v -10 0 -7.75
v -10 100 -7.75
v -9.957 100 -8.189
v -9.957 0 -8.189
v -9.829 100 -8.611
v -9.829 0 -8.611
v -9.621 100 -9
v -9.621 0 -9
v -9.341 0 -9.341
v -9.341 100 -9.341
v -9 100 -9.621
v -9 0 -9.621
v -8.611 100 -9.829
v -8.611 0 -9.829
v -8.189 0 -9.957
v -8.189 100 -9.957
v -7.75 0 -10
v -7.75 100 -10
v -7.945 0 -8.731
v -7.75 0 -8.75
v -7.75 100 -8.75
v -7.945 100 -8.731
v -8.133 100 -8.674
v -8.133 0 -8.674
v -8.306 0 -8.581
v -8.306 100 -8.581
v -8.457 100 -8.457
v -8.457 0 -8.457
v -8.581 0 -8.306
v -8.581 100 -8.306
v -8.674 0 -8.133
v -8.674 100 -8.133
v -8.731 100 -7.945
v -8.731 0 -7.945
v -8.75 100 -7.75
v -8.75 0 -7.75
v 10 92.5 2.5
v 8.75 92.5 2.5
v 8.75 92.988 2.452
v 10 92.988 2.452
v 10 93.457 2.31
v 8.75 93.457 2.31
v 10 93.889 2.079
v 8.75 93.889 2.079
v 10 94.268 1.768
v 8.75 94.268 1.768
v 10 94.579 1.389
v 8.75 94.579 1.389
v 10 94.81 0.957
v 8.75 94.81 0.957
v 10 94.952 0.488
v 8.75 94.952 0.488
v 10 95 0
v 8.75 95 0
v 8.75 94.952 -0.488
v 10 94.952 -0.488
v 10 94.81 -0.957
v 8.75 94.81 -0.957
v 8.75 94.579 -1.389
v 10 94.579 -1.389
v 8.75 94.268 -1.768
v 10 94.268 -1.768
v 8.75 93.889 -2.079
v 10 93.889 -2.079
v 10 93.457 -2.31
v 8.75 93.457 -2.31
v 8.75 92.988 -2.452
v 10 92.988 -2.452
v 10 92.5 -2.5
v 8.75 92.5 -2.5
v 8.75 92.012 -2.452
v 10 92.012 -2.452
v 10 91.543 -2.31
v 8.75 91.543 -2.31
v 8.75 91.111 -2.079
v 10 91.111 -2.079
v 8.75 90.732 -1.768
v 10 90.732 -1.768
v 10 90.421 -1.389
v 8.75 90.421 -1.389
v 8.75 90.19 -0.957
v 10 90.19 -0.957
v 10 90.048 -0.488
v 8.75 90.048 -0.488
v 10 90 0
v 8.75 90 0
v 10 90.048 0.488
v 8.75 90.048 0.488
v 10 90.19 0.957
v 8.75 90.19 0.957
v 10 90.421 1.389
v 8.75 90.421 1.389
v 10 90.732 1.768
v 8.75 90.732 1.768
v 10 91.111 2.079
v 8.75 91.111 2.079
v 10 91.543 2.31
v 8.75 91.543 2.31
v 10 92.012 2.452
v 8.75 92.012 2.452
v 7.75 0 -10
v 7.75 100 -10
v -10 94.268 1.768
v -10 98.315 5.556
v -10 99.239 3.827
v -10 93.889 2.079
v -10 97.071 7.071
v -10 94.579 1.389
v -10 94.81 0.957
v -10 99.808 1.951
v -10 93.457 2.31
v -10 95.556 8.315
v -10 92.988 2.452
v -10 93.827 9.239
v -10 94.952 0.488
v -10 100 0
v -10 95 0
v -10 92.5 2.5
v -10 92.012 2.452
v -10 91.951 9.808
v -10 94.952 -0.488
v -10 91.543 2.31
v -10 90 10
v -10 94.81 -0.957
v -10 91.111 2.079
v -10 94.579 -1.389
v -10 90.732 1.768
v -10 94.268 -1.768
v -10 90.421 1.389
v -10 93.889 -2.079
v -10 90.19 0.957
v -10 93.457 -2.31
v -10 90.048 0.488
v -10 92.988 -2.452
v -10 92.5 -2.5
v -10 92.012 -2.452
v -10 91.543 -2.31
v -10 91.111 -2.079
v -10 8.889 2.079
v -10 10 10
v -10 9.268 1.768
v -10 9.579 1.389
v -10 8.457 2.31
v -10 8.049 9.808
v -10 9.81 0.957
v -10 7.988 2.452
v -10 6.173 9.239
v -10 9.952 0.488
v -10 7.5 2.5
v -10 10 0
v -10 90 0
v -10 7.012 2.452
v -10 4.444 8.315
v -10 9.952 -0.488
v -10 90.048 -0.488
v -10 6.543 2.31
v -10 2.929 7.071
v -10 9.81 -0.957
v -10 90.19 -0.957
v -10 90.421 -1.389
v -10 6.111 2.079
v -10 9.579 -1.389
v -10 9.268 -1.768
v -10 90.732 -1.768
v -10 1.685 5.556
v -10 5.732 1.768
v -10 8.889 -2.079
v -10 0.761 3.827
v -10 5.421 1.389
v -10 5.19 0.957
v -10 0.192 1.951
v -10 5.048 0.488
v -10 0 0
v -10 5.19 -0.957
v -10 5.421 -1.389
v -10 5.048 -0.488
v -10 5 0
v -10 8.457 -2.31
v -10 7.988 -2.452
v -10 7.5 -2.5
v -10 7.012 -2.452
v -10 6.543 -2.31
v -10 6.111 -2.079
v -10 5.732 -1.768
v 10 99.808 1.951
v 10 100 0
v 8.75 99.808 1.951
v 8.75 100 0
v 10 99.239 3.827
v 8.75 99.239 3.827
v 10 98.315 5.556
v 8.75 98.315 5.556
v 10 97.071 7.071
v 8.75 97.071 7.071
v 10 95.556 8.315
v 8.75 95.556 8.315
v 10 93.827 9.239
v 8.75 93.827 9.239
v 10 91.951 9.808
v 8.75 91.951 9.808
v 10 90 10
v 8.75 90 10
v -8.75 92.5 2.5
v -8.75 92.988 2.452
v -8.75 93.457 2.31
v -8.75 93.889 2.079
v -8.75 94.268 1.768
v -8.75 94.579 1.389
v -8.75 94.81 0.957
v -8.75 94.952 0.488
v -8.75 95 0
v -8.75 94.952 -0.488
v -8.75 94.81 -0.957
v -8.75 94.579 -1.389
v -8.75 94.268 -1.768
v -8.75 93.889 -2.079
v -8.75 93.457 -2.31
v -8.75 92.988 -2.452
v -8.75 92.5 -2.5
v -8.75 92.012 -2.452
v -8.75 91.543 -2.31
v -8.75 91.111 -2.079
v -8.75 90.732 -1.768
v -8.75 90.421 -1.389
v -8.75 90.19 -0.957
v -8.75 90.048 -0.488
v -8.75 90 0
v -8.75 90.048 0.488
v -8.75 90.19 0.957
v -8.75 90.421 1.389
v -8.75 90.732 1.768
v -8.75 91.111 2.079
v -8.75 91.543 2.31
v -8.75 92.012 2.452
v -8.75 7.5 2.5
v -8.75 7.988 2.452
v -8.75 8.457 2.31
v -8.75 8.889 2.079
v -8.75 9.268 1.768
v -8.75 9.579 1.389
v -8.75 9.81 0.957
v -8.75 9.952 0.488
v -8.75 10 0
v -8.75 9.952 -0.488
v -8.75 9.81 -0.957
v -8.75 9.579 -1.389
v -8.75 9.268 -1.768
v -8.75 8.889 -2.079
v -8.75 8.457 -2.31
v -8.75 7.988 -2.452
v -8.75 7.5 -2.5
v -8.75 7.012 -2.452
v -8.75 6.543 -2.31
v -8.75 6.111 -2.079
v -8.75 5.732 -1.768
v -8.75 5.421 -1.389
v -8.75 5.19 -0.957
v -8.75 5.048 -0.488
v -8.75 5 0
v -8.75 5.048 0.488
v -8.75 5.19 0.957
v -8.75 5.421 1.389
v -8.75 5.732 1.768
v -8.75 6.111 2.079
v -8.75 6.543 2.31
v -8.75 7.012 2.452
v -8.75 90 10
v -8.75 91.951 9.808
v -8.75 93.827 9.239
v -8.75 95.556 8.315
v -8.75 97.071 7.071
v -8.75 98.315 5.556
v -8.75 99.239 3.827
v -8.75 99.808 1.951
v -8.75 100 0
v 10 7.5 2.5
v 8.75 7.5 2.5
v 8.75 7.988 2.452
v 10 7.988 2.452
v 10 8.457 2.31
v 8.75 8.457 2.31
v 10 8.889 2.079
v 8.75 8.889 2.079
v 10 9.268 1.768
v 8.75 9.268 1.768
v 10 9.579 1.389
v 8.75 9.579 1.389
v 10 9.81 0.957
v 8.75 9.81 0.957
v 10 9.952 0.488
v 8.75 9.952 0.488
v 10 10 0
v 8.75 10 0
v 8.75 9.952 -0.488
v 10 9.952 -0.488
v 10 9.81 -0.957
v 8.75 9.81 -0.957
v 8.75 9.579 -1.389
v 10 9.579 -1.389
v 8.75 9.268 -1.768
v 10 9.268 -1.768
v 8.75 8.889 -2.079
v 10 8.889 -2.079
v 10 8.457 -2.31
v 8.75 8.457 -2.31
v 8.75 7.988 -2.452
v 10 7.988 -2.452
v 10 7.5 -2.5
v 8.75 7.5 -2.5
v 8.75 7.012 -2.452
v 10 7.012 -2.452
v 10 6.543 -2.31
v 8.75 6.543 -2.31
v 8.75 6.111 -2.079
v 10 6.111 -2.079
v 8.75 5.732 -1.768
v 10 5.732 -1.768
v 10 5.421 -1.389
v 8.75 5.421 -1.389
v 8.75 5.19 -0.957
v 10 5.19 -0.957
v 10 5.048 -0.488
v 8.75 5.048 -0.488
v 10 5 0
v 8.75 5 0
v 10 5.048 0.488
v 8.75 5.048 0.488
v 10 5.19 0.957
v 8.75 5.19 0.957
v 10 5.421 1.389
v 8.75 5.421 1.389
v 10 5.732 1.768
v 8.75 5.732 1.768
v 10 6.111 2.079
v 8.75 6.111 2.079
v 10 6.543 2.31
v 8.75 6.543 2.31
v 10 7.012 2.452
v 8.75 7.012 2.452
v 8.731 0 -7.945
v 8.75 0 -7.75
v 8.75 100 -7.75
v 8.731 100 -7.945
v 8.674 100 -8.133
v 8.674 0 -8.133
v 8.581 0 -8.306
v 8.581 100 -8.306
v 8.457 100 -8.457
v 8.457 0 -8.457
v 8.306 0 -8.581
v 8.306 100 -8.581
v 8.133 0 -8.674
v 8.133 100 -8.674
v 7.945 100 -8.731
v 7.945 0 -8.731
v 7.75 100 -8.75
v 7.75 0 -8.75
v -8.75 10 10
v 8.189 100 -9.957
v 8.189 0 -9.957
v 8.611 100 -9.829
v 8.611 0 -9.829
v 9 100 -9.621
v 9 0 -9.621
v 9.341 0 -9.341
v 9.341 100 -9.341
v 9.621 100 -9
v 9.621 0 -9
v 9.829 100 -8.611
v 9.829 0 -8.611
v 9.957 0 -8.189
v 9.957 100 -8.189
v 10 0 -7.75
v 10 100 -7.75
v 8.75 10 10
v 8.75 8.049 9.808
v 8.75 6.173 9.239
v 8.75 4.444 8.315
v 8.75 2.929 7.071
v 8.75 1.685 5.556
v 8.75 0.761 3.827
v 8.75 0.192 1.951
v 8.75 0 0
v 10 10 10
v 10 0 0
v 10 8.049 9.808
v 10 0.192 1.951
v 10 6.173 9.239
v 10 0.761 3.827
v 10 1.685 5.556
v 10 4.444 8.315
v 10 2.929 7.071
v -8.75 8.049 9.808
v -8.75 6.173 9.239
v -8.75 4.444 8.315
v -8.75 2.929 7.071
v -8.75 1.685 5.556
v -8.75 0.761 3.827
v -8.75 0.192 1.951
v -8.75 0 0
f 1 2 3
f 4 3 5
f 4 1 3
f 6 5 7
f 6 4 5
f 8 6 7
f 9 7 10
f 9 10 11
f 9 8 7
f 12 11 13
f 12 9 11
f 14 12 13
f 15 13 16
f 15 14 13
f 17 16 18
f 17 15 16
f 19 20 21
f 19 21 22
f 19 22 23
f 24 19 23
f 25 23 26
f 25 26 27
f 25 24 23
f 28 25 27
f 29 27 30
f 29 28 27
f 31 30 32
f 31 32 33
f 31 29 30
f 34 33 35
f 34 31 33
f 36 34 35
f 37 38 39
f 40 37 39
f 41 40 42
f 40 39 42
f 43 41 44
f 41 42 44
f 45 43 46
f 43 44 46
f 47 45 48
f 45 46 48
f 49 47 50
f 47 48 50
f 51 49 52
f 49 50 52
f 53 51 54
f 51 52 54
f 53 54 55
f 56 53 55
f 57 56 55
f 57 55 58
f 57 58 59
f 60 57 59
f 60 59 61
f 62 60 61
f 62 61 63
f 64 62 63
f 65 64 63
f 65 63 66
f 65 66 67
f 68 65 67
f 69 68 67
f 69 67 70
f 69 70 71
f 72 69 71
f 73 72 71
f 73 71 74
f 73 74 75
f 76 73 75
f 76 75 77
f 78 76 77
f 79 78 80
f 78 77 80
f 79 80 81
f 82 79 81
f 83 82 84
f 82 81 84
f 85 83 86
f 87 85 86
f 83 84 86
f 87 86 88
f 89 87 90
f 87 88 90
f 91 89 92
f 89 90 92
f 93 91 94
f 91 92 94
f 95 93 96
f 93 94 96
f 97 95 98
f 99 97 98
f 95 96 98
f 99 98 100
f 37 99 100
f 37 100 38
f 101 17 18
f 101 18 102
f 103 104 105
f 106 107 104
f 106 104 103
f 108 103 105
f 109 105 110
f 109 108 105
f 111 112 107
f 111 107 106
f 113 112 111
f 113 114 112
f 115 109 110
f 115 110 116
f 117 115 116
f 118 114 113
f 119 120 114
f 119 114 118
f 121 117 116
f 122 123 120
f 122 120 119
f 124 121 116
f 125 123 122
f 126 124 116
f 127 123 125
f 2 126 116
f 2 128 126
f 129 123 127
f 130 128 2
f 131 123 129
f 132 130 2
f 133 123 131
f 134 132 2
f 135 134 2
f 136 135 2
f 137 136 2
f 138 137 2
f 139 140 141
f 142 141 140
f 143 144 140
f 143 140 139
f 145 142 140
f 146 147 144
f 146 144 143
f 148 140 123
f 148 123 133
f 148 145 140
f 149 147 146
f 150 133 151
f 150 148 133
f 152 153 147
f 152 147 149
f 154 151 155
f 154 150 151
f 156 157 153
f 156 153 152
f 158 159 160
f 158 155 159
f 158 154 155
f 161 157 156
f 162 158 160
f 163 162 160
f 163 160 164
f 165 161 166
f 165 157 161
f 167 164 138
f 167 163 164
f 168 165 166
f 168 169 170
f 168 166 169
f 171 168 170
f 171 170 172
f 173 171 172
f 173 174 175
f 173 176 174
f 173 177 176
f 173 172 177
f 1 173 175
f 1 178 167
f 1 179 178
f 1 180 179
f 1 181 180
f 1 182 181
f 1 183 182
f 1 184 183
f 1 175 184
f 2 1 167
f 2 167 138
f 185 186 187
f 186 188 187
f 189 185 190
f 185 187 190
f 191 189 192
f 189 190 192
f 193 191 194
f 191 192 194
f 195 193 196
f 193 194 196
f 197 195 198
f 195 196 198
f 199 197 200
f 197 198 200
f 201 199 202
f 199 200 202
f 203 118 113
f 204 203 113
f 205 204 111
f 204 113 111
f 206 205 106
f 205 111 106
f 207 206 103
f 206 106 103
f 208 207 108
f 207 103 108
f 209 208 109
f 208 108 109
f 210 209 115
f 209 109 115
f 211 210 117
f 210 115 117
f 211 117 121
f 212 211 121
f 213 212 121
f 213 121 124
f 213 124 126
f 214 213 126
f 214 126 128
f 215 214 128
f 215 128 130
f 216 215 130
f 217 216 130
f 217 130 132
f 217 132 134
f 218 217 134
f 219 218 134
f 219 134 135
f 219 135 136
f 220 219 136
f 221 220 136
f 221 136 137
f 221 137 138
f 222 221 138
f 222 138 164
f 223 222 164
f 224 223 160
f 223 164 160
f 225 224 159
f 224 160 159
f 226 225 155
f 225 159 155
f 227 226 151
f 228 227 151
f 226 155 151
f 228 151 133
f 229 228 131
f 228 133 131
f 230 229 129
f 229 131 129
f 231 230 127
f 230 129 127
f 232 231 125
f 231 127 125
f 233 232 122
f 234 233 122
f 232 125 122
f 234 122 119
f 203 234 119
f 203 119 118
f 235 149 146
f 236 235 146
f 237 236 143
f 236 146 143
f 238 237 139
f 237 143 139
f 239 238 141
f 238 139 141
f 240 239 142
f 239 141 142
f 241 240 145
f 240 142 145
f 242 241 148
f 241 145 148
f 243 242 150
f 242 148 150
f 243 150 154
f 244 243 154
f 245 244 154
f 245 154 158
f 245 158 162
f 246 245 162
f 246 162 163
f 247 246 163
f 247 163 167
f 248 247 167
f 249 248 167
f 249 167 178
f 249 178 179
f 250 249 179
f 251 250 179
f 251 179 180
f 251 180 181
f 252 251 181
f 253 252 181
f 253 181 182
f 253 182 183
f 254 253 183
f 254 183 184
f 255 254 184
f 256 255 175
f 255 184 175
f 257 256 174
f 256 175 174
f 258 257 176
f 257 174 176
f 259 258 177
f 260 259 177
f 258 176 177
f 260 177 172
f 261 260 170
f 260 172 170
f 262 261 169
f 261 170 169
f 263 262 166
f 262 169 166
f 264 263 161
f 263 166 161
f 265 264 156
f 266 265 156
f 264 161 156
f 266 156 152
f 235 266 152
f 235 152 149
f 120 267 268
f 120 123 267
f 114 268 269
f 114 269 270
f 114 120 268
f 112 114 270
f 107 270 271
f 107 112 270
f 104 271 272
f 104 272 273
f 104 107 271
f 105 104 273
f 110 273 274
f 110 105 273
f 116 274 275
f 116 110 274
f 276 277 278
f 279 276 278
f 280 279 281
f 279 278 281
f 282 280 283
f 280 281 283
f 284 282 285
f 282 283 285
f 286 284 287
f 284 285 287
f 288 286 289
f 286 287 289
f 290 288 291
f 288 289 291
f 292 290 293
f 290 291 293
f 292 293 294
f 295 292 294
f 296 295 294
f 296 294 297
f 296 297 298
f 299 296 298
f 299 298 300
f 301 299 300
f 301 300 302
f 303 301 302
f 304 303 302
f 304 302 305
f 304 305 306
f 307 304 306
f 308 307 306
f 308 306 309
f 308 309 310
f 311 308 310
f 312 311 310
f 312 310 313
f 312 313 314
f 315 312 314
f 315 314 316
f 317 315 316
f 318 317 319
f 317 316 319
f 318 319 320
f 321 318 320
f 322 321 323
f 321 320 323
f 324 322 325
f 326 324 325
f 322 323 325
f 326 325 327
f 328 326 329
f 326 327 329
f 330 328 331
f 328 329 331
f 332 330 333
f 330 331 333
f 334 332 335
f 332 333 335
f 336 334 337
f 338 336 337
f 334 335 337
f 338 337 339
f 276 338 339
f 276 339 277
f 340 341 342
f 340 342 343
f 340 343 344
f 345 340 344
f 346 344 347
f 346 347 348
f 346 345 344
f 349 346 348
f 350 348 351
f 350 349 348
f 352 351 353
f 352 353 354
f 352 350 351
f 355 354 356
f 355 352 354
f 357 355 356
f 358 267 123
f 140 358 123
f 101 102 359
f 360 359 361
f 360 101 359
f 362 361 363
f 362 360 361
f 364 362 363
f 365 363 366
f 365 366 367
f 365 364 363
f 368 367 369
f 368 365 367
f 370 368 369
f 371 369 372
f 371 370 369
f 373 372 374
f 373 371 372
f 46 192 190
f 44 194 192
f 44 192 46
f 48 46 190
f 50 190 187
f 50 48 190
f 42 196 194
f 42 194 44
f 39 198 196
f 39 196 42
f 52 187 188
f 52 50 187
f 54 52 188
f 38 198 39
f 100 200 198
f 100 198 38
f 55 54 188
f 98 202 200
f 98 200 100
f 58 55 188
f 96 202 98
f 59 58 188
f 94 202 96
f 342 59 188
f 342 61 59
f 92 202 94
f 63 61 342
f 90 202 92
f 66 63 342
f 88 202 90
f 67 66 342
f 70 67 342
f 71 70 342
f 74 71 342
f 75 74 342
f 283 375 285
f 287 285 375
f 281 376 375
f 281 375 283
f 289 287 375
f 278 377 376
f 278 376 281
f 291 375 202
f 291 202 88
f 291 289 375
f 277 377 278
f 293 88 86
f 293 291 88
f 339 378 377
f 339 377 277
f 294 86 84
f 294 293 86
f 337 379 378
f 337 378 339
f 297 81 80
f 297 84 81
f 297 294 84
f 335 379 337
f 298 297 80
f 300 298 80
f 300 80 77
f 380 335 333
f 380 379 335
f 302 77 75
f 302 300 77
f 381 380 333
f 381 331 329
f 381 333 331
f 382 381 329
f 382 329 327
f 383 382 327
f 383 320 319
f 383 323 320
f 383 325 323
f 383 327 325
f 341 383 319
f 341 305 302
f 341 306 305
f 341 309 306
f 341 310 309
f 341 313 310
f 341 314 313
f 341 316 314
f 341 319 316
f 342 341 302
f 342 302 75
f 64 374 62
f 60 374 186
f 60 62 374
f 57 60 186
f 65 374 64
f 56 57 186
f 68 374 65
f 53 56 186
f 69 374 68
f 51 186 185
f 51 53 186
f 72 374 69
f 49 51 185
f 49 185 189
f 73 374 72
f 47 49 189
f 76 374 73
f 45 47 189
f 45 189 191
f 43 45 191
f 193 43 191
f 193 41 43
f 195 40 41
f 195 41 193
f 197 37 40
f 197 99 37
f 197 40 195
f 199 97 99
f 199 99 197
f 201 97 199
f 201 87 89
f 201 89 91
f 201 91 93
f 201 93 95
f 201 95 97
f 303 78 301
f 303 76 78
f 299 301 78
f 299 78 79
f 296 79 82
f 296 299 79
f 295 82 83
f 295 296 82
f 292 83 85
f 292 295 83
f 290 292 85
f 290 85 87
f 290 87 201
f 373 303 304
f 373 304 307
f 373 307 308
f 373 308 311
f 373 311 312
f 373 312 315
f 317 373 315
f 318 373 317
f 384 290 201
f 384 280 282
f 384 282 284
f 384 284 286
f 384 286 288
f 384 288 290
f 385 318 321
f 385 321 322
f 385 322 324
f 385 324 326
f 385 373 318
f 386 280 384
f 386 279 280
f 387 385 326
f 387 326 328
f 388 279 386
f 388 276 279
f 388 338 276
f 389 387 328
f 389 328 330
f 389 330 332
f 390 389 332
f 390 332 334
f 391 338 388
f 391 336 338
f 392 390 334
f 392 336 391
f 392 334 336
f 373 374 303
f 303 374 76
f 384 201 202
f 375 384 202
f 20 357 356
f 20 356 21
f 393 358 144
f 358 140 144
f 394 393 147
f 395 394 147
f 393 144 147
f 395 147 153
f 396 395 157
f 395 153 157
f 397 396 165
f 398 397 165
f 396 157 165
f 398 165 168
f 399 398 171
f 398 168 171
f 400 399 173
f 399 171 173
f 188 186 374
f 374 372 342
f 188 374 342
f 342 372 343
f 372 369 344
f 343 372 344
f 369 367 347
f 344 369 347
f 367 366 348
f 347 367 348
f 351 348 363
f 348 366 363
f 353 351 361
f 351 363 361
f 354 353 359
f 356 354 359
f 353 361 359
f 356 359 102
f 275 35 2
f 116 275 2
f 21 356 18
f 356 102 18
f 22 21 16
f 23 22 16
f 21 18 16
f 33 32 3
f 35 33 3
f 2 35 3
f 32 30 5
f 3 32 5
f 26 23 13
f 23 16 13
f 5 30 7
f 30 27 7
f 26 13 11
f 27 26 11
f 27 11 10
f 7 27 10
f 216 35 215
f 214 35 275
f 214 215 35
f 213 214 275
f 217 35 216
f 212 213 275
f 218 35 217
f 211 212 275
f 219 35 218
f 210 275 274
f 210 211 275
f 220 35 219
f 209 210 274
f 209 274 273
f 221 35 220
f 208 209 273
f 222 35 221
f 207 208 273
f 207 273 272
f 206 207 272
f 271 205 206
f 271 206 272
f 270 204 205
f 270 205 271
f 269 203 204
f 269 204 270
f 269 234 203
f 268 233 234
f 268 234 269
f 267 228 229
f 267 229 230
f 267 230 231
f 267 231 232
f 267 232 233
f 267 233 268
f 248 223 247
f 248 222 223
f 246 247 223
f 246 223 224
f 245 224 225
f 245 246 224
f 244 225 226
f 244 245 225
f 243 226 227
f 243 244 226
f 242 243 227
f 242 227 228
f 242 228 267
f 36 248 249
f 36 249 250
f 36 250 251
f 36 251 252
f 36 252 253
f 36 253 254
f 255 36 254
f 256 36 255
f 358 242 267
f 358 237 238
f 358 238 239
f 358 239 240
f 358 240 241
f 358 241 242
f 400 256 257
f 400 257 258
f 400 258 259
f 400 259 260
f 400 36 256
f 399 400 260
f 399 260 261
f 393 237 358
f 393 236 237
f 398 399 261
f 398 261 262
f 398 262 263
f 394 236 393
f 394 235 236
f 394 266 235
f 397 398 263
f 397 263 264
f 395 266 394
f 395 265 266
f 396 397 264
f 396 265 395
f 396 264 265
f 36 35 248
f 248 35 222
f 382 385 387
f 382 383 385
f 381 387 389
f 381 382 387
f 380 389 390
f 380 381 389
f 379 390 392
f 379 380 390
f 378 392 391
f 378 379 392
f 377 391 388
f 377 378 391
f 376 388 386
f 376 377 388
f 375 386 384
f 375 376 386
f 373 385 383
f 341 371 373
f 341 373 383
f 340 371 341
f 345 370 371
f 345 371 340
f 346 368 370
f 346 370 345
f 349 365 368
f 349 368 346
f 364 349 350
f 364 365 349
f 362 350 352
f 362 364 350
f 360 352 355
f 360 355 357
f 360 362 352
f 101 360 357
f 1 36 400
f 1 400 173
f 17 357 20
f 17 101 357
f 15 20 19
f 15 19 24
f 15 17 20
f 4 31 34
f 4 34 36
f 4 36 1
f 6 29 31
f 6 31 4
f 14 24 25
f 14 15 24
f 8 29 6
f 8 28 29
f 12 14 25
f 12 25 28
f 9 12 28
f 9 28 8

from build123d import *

# Parameters (mm, degrees)
BASE_FLANGE1_DEPTH = 100
CUT_EXTRUDE1_REACH = 104.47
SKETCH3_R          = 2.5
FILLET1_R          = 10


# Sheet-metal steps are written as plain solids
with BuildPart() as part:
    # Sketch2 → Base-Flange1 (new body)
    with BuildSketch(Plane(origin=(0, 0, 0), x_dir=(1, 0, 0), z_dir=(0, 1, 0))):
        with BuildLine():
            Line((-10, -10), (-10, 7.75))
            ThreePointArc((-10, 7.75), (-9.340990258, 9.340990258), (-7.75, 10))
            Line((-7.75, 10), (7.75, 10))
            ThreePointArc((7.75, 10), (9.340990258, 9.340990258), (10, 7.75))
            Line((10, 7.75), (10, -10))
            Line((10, -10), (8.75, -10))
            Line((8.75, -10), (8.75, 7.75))
            ThreePointArc((8.75, 7.75), (8.457106781, 8.457106781), (7.75, 8.75))
            Line((7.75, 8.75), (-7.75, 8.75))
            ThreePointArc((-7.75, 8.75), (-8.457106781, 8.457106781), (-8.75, 7.75))
            Line((-8.75, 7.75), (-8.75, -10))
            Line((-8.75, -10), (-10, -10))
        make_face()
    extrude(amount=BASE_FLANGE1_DEPTH)

    # Cut-Extrude1: up to this face of the body (flat: up to its plane)
    cut_extrude1_end = Plane(part.part.faces().sort_by_distance((10, 50, 1.125))[0])
    # Sketch3 → Cut-Extrude1 (cut, up to the picked face)
    with BuildSketch(Plane.ZY.offset(10), mode=Mode.PRIVATE) as cut_extrude1_sk1:
        with Locations((0, 7.5)):
            Circle(SKETCH3_R)
    cut_extrude1_tool1 = split(extrude(cut_extrude1_sk1.sketch, amount=-CUT_EXTRUDE1_REACH, mode=Mode.PRIVATE), bisect_by=cut_extrude1_end, keep=Keep.BOTH, mode=Mode.PRIVATE)
    # Sketch3 → Cut-Extrude1 (cut, up to the picked face)
    with BuildSketch(Plane.ZY.offset(10), mode=Mode.PRIVATE) as cut_extrude1_sk2:
        with Locations((0, 92.5)):
            Circle(SKETCH3_R)
    cut_extrude1_tool2 = split(extrude(cut_extrude1_sk2.sketch, amount=-CUT_EXTRUDE1_REACH, mode=Mode.PRIVATE), bisect_by=cut_extrude1_end, keep=Keep.BOTH, mode=Mode.PRIVATE)
    add(cut_extrude1_tool1.solids().sort_by(Axis((-10, 7.5, 0), (1, 0, 0)))[0], mode=Mode.SUBTRACT)
    add(cut_extrude1_tool2.solids().sort_by(Axis((-10, 92.5, 0), (1, 0, 0)))[0], mode=Mode.SUBTRACT)

    # Fillet1
    fillet1_edges = [part.edges().sort_by_distance(p)[0] for p in [
        (-9.375, 0, 10),
        (9.375, 0, 10),
        (-9.375, 100, 10),
        (9.375, 100, 10),
    ]]
    fillet(fillet1_edges, radius=FILLET1_R)


solid = part.part
